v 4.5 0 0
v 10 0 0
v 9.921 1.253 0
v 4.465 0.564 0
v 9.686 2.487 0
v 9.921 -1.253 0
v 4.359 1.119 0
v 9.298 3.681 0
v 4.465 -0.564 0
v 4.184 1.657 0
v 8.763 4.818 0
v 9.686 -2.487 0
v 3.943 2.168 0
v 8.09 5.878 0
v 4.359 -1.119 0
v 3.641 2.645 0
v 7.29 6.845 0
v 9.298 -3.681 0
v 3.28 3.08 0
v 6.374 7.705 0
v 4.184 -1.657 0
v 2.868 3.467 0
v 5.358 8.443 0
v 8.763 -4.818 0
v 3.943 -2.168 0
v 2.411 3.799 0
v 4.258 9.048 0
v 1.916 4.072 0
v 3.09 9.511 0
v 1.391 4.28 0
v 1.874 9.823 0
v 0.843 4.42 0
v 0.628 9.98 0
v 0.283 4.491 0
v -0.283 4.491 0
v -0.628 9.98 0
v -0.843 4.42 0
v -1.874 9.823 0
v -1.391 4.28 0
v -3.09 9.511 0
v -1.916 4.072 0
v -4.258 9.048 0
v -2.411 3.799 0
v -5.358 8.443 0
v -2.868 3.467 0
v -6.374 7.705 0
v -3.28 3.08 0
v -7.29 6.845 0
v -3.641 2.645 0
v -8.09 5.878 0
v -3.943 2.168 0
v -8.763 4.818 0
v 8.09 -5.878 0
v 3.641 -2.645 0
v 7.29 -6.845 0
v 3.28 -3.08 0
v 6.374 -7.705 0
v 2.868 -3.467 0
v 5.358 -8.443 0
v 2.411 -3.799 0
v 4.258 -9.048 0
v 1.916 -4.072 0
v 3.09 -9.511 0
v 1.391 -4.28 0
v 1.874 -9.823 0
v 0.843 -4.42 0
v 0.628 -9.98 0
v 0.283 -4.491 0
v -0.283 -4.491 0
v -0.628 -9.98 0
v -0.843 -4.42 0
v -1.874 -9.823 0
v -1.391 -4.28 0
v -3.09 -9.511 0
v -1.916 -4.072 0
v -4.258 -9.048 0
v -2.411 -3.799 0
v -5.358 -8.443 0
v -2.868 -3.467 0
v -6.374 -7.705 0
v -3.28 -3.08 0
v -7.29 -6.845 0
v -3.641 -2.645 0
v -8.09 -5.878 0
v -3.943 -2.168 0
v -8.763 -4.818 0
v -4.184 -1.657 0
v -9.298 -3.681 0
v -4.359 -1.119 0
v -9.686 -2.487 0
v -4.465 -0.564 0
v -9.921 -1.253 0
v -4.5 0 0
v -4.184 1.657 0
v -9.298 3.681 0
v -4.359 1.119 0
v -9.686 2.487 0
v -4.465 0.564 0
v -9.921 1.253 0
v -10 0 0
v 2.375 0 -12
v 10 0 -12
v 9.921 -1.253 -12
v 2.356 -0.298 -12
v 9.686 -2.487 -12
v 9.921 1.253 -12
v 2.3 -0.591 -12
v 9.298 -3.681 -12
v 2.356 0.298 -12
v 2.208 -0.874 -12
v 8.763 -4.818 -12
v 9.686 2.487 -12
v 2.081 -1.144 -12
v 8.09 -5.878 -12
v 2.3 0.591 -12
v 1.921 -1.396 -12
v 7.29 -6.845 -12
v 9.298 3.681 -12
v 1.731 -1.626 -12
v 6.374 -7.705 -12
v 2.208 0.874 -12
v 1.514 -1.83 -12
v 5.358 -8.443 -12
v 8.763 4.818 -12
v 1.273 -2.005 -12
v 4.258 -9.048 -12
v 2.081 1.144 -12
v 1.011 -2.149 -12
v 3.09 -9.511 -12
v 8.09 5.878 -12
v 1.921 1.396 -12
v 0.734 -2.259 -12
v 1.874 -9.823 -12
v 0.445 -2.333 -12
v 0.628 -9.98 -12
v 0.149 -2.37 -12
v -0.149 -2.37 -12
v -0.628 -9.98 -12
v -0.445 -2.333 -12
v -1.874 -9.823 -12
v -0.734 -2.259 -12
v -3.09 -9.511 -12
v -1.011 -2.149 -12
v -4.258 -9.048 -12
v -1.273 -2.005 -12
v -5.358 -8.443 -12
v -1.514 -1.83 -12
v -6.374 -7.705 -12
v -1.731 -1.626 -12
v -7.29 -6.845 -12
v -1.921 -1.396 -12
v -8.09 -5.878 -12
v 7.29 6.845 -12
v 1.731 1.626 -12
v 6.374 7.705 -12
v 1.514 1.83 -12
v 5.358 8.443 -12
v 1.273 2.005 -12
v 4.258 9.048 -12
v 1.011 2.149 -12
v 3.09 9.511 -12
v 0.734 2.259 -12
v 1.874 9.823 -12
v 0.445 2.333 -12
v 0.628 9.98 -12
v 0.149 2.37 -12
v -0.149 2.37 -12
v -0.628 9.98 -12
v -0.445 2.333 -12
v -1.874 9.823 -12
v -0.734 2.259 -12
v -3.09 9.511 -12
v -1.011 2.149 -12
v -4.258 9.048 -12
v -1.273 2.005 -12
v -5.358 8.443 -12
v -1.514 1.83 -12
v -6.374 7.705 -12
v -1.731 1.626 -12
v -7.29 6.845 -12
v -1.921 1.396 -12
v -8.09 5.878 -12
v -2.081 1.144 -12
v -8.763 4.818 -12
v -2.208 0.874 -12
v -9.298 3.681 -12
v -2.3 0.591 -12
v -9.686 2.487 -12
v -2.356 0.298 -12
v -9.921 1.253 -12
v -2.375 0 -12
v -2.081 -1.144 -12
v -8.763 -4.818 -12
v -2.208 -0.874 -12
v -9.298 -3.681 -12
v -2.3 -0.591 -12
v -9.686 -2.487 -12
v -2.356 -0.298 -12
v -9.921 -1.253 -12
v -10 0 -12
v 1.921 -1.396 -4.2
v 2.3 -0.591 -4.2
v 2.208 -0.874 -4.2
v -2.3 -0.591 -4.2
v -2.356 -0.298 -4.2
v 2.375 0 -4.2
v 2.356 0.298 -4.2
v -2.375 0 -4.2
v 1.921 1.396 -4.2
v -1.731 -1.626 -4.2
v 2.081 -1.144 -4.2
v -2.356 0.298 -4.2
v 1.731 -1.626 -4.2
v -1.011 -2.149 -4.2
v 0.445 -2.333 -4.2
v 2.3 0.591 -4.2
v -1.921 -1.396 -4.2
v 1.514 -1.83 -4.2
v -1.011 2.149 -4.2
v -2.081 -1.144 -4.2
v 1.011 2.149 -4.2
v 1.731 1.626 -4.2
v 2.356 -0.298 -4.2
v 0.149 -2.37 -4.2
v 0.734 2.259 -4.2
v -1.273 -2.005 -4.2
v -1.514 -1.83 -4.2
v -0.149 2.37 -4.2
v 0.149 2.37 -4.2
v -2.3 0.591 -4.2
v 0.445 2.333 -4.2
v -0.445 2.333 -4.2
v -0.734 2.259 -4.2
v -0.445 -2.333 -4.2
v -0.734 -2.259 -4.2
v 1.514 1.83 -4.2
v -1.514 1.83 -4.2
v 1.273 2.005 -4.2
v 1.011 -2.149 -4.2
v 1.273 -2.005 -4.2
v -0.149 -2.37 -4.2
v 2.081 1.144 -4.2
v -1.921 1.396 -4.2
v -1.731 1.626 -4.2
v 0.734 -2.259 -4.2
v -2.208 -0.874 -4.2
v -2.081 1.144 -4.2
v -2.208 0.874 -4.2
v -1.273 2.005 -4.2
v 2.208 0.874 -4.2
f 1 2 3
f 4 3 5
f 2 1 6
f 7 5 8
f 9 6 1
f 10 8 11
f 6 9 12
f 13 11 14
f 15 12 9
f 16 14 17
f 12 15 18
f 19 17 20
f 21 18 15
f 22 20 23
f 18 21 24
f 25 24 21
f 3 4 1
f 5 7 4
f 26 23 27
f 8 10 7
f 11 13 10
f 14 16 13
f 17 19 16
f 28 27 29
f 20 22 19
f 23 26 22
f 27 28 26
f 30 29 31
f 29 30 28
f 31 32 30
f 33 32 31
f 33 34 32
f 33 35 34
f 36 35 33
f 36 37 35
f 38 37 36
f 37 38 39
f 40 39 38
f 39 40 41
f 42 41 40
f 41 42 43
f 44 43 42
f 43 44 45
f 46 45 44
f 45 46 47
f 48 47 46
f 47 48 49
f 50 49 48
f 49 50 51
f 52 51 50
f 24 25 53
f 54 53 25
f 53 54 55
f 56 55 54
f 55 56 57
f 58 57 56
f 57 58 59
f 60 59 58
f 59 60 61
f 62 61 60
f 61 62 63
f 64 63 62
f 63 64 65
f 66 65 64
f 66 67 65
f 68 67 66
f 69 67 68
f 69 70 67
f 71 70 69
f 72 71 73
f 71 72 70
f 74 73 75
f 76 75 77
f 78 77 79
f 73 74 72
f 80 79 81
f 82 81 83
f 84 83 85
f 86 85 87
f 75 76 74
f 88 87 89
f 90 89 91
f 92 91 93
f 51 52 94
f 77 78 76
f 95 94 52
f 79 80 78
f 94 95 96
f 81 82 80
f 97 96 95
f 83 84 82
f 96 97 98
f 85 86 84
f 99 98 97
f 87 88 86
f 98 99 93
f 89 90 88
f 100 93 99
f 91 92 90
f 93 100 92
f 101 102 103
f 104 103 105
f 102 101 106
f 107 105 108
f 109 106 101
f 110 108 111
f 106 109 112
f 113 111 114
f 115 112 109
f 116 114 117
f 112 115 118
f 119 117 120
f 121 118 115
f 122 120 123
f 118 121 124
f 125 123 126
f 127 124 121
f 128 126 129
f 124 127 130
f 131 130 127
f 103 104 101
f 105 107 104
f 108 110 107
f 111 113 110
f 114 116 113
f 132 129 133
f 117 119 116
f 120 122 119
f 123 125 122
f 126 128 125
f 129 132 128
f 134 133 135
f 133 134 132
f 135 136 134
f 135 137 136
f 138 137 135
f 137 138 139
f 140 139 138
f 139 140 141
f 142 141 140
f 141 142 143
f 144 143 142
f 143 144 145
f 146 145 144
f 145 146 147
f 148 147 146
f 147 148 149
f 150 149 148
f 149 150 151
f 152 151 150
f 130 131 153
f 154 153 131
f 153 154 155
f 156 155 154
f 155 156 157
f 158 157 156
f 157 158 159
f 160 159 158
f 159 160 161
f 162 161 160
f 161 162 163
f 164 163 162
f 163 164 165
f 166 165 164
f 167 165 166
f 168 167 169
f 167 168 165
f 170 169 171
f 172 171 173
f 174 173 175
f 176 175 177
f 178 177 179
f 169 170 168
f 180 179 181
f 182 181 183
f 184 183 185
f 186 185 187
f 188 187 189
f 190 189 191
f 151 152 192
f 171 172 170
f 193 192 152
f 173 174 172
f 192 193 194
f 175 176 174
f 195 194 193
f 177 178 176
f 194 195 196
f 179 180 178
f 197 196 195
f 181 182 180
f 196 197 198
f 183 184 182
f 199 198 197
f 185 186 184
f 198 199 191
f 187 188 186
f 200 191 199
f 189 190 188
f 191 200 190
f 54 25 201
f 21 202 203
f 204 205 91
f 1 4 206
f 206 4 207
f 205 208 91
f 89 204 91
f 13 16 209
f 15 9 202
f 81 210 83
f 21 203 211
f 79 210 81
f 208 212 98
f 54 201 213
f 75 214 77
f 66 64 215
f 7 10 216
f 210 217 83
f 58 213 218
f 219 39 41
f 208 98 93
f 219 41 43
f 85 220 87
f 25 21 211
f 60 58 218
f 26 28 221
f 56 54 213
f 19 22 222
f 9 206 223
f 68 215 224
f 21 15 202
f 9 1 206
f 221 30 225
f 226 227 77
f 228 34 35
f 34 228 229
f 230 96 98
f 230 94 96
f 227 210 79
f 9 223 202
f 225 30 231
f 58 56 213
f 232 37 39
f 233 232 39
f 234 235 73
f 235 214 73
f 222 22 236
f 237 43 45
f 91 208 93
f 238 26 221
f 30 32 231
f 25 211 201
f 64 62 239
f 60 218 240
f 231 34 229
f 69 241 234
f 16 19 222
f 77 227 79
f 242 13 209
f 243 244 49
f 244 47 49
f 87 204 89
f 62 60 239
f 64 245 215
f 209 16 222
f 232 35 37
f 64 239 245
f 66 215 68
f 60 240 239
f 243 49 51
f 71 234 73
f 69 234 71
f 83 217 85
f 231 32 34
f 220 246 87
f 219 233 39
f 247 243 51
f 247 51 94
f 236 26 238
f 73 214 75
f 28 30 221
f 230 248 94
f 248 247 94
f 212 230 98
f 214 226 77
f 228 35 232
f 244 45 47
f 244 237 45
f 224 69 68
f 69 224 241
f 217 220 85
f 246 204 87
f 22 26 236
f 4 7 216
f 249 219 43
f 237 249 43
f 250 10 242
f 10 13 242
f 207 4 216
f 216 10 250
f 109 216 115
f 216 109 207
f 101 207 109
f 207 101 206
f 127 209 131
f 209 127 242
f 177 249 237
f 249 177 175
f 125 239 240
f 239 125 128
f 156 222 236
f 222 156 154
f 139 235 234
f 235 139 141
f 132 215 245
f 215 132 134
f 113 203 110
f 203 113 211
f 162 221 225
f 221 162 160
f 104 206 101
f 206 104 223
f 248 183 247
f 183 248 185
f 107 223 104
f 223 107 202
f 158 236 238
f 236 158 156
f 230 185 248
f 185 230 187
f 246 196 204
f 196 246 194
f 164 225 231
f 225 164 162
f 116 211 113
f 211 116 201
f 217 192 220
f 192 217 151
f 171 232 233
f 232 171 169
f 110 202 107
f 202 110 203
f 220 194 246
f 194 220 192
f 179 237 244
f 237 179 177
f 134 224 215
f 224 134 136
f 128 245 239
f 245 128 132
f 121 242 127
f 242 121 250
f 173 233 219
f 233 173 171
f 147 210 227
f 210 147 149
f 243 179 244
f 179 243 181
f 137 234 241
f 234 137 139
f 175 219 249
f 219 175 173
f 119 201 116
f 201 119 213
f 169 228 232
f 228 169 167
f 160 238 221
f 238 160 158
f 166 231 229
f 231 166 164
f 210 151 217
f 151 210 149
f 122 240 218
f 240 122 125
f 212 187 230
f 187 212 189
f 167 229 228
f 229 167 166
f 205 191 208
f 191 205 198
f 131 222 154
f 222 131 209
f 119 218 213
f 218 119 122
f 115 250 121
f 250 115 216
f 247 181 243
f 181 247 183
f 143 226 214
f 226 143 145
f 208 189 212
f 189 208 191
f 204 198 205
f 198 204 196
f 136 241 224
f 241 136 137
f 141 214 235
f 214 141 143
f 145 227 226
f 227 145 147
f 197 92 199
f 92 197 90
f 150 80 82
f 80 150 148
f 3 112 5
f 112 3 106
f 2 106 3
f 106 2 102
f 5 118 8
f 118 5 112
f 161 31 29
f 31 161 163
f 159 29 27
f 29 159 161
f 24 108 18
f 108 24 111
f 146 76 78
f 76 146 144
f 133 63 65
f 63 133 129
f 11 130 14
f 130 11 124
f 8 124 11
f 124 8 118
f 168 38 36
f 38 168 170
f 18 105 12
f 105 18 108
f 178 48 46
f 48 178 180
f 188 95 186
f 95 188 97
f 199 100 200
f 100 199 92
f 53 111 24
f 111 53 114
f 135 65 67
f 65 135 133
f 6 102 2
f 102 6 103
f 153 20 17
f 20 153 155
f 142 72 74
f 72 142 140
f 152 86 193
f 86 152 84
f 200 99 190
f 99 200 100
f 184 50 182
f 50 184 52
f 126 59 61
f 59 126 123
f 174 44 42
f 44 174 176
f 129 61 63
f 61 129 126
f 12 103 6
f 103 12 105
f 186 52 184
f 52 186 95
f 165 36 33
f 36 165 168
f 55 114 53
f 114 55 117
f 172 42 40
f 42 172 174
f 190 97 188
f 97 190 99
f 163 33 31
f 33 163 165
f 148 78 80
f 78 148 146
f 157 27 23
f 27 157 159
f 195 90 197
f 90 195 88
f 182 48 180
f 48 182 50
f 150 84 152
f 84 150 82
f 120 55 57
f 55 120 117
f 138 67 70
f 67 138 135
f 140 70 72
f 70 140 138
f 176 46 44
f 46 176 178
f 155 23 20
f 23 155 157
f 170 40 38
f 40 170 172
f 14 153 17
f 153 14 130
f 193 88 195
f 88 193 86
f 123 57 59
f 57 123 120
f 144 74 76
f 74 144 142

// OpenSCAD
$fn = 50;


difference() {
	union() {
		translate(v = [0, 0, -12.0000000000]) {
			cylinder(h = 12, r = 10.0000000000);
		}
		cylinder(h = 0, r = 16.0000000000);
	}
	union() {
		translate(v = [0, 0, 0]) {
			rotate(a = [0, 0, 0]) {
				difference() {
					union() {
						#translate(v = [0, 0, -12.0000000000]) {
							cylinder(h = 12, r = 2.2500000000);
						}
						#translate(v = [0, 0, -4.2000000000]) {
							cylinder(h = 4.2000000000, r1 = 2.3750000000, r2 = 4.5000000000);
						}
						#translate(v = [0, 0, -12.0000000000]) {
							cylinder(h = 12, r = 2.3750000000);
						}
						#translate(v = [0, 0, -12.0000000000]) {
							cylinder(h = 12, r = 2.2500000000);
						}
					}
					union();
				}
			}
		}
	}
}
